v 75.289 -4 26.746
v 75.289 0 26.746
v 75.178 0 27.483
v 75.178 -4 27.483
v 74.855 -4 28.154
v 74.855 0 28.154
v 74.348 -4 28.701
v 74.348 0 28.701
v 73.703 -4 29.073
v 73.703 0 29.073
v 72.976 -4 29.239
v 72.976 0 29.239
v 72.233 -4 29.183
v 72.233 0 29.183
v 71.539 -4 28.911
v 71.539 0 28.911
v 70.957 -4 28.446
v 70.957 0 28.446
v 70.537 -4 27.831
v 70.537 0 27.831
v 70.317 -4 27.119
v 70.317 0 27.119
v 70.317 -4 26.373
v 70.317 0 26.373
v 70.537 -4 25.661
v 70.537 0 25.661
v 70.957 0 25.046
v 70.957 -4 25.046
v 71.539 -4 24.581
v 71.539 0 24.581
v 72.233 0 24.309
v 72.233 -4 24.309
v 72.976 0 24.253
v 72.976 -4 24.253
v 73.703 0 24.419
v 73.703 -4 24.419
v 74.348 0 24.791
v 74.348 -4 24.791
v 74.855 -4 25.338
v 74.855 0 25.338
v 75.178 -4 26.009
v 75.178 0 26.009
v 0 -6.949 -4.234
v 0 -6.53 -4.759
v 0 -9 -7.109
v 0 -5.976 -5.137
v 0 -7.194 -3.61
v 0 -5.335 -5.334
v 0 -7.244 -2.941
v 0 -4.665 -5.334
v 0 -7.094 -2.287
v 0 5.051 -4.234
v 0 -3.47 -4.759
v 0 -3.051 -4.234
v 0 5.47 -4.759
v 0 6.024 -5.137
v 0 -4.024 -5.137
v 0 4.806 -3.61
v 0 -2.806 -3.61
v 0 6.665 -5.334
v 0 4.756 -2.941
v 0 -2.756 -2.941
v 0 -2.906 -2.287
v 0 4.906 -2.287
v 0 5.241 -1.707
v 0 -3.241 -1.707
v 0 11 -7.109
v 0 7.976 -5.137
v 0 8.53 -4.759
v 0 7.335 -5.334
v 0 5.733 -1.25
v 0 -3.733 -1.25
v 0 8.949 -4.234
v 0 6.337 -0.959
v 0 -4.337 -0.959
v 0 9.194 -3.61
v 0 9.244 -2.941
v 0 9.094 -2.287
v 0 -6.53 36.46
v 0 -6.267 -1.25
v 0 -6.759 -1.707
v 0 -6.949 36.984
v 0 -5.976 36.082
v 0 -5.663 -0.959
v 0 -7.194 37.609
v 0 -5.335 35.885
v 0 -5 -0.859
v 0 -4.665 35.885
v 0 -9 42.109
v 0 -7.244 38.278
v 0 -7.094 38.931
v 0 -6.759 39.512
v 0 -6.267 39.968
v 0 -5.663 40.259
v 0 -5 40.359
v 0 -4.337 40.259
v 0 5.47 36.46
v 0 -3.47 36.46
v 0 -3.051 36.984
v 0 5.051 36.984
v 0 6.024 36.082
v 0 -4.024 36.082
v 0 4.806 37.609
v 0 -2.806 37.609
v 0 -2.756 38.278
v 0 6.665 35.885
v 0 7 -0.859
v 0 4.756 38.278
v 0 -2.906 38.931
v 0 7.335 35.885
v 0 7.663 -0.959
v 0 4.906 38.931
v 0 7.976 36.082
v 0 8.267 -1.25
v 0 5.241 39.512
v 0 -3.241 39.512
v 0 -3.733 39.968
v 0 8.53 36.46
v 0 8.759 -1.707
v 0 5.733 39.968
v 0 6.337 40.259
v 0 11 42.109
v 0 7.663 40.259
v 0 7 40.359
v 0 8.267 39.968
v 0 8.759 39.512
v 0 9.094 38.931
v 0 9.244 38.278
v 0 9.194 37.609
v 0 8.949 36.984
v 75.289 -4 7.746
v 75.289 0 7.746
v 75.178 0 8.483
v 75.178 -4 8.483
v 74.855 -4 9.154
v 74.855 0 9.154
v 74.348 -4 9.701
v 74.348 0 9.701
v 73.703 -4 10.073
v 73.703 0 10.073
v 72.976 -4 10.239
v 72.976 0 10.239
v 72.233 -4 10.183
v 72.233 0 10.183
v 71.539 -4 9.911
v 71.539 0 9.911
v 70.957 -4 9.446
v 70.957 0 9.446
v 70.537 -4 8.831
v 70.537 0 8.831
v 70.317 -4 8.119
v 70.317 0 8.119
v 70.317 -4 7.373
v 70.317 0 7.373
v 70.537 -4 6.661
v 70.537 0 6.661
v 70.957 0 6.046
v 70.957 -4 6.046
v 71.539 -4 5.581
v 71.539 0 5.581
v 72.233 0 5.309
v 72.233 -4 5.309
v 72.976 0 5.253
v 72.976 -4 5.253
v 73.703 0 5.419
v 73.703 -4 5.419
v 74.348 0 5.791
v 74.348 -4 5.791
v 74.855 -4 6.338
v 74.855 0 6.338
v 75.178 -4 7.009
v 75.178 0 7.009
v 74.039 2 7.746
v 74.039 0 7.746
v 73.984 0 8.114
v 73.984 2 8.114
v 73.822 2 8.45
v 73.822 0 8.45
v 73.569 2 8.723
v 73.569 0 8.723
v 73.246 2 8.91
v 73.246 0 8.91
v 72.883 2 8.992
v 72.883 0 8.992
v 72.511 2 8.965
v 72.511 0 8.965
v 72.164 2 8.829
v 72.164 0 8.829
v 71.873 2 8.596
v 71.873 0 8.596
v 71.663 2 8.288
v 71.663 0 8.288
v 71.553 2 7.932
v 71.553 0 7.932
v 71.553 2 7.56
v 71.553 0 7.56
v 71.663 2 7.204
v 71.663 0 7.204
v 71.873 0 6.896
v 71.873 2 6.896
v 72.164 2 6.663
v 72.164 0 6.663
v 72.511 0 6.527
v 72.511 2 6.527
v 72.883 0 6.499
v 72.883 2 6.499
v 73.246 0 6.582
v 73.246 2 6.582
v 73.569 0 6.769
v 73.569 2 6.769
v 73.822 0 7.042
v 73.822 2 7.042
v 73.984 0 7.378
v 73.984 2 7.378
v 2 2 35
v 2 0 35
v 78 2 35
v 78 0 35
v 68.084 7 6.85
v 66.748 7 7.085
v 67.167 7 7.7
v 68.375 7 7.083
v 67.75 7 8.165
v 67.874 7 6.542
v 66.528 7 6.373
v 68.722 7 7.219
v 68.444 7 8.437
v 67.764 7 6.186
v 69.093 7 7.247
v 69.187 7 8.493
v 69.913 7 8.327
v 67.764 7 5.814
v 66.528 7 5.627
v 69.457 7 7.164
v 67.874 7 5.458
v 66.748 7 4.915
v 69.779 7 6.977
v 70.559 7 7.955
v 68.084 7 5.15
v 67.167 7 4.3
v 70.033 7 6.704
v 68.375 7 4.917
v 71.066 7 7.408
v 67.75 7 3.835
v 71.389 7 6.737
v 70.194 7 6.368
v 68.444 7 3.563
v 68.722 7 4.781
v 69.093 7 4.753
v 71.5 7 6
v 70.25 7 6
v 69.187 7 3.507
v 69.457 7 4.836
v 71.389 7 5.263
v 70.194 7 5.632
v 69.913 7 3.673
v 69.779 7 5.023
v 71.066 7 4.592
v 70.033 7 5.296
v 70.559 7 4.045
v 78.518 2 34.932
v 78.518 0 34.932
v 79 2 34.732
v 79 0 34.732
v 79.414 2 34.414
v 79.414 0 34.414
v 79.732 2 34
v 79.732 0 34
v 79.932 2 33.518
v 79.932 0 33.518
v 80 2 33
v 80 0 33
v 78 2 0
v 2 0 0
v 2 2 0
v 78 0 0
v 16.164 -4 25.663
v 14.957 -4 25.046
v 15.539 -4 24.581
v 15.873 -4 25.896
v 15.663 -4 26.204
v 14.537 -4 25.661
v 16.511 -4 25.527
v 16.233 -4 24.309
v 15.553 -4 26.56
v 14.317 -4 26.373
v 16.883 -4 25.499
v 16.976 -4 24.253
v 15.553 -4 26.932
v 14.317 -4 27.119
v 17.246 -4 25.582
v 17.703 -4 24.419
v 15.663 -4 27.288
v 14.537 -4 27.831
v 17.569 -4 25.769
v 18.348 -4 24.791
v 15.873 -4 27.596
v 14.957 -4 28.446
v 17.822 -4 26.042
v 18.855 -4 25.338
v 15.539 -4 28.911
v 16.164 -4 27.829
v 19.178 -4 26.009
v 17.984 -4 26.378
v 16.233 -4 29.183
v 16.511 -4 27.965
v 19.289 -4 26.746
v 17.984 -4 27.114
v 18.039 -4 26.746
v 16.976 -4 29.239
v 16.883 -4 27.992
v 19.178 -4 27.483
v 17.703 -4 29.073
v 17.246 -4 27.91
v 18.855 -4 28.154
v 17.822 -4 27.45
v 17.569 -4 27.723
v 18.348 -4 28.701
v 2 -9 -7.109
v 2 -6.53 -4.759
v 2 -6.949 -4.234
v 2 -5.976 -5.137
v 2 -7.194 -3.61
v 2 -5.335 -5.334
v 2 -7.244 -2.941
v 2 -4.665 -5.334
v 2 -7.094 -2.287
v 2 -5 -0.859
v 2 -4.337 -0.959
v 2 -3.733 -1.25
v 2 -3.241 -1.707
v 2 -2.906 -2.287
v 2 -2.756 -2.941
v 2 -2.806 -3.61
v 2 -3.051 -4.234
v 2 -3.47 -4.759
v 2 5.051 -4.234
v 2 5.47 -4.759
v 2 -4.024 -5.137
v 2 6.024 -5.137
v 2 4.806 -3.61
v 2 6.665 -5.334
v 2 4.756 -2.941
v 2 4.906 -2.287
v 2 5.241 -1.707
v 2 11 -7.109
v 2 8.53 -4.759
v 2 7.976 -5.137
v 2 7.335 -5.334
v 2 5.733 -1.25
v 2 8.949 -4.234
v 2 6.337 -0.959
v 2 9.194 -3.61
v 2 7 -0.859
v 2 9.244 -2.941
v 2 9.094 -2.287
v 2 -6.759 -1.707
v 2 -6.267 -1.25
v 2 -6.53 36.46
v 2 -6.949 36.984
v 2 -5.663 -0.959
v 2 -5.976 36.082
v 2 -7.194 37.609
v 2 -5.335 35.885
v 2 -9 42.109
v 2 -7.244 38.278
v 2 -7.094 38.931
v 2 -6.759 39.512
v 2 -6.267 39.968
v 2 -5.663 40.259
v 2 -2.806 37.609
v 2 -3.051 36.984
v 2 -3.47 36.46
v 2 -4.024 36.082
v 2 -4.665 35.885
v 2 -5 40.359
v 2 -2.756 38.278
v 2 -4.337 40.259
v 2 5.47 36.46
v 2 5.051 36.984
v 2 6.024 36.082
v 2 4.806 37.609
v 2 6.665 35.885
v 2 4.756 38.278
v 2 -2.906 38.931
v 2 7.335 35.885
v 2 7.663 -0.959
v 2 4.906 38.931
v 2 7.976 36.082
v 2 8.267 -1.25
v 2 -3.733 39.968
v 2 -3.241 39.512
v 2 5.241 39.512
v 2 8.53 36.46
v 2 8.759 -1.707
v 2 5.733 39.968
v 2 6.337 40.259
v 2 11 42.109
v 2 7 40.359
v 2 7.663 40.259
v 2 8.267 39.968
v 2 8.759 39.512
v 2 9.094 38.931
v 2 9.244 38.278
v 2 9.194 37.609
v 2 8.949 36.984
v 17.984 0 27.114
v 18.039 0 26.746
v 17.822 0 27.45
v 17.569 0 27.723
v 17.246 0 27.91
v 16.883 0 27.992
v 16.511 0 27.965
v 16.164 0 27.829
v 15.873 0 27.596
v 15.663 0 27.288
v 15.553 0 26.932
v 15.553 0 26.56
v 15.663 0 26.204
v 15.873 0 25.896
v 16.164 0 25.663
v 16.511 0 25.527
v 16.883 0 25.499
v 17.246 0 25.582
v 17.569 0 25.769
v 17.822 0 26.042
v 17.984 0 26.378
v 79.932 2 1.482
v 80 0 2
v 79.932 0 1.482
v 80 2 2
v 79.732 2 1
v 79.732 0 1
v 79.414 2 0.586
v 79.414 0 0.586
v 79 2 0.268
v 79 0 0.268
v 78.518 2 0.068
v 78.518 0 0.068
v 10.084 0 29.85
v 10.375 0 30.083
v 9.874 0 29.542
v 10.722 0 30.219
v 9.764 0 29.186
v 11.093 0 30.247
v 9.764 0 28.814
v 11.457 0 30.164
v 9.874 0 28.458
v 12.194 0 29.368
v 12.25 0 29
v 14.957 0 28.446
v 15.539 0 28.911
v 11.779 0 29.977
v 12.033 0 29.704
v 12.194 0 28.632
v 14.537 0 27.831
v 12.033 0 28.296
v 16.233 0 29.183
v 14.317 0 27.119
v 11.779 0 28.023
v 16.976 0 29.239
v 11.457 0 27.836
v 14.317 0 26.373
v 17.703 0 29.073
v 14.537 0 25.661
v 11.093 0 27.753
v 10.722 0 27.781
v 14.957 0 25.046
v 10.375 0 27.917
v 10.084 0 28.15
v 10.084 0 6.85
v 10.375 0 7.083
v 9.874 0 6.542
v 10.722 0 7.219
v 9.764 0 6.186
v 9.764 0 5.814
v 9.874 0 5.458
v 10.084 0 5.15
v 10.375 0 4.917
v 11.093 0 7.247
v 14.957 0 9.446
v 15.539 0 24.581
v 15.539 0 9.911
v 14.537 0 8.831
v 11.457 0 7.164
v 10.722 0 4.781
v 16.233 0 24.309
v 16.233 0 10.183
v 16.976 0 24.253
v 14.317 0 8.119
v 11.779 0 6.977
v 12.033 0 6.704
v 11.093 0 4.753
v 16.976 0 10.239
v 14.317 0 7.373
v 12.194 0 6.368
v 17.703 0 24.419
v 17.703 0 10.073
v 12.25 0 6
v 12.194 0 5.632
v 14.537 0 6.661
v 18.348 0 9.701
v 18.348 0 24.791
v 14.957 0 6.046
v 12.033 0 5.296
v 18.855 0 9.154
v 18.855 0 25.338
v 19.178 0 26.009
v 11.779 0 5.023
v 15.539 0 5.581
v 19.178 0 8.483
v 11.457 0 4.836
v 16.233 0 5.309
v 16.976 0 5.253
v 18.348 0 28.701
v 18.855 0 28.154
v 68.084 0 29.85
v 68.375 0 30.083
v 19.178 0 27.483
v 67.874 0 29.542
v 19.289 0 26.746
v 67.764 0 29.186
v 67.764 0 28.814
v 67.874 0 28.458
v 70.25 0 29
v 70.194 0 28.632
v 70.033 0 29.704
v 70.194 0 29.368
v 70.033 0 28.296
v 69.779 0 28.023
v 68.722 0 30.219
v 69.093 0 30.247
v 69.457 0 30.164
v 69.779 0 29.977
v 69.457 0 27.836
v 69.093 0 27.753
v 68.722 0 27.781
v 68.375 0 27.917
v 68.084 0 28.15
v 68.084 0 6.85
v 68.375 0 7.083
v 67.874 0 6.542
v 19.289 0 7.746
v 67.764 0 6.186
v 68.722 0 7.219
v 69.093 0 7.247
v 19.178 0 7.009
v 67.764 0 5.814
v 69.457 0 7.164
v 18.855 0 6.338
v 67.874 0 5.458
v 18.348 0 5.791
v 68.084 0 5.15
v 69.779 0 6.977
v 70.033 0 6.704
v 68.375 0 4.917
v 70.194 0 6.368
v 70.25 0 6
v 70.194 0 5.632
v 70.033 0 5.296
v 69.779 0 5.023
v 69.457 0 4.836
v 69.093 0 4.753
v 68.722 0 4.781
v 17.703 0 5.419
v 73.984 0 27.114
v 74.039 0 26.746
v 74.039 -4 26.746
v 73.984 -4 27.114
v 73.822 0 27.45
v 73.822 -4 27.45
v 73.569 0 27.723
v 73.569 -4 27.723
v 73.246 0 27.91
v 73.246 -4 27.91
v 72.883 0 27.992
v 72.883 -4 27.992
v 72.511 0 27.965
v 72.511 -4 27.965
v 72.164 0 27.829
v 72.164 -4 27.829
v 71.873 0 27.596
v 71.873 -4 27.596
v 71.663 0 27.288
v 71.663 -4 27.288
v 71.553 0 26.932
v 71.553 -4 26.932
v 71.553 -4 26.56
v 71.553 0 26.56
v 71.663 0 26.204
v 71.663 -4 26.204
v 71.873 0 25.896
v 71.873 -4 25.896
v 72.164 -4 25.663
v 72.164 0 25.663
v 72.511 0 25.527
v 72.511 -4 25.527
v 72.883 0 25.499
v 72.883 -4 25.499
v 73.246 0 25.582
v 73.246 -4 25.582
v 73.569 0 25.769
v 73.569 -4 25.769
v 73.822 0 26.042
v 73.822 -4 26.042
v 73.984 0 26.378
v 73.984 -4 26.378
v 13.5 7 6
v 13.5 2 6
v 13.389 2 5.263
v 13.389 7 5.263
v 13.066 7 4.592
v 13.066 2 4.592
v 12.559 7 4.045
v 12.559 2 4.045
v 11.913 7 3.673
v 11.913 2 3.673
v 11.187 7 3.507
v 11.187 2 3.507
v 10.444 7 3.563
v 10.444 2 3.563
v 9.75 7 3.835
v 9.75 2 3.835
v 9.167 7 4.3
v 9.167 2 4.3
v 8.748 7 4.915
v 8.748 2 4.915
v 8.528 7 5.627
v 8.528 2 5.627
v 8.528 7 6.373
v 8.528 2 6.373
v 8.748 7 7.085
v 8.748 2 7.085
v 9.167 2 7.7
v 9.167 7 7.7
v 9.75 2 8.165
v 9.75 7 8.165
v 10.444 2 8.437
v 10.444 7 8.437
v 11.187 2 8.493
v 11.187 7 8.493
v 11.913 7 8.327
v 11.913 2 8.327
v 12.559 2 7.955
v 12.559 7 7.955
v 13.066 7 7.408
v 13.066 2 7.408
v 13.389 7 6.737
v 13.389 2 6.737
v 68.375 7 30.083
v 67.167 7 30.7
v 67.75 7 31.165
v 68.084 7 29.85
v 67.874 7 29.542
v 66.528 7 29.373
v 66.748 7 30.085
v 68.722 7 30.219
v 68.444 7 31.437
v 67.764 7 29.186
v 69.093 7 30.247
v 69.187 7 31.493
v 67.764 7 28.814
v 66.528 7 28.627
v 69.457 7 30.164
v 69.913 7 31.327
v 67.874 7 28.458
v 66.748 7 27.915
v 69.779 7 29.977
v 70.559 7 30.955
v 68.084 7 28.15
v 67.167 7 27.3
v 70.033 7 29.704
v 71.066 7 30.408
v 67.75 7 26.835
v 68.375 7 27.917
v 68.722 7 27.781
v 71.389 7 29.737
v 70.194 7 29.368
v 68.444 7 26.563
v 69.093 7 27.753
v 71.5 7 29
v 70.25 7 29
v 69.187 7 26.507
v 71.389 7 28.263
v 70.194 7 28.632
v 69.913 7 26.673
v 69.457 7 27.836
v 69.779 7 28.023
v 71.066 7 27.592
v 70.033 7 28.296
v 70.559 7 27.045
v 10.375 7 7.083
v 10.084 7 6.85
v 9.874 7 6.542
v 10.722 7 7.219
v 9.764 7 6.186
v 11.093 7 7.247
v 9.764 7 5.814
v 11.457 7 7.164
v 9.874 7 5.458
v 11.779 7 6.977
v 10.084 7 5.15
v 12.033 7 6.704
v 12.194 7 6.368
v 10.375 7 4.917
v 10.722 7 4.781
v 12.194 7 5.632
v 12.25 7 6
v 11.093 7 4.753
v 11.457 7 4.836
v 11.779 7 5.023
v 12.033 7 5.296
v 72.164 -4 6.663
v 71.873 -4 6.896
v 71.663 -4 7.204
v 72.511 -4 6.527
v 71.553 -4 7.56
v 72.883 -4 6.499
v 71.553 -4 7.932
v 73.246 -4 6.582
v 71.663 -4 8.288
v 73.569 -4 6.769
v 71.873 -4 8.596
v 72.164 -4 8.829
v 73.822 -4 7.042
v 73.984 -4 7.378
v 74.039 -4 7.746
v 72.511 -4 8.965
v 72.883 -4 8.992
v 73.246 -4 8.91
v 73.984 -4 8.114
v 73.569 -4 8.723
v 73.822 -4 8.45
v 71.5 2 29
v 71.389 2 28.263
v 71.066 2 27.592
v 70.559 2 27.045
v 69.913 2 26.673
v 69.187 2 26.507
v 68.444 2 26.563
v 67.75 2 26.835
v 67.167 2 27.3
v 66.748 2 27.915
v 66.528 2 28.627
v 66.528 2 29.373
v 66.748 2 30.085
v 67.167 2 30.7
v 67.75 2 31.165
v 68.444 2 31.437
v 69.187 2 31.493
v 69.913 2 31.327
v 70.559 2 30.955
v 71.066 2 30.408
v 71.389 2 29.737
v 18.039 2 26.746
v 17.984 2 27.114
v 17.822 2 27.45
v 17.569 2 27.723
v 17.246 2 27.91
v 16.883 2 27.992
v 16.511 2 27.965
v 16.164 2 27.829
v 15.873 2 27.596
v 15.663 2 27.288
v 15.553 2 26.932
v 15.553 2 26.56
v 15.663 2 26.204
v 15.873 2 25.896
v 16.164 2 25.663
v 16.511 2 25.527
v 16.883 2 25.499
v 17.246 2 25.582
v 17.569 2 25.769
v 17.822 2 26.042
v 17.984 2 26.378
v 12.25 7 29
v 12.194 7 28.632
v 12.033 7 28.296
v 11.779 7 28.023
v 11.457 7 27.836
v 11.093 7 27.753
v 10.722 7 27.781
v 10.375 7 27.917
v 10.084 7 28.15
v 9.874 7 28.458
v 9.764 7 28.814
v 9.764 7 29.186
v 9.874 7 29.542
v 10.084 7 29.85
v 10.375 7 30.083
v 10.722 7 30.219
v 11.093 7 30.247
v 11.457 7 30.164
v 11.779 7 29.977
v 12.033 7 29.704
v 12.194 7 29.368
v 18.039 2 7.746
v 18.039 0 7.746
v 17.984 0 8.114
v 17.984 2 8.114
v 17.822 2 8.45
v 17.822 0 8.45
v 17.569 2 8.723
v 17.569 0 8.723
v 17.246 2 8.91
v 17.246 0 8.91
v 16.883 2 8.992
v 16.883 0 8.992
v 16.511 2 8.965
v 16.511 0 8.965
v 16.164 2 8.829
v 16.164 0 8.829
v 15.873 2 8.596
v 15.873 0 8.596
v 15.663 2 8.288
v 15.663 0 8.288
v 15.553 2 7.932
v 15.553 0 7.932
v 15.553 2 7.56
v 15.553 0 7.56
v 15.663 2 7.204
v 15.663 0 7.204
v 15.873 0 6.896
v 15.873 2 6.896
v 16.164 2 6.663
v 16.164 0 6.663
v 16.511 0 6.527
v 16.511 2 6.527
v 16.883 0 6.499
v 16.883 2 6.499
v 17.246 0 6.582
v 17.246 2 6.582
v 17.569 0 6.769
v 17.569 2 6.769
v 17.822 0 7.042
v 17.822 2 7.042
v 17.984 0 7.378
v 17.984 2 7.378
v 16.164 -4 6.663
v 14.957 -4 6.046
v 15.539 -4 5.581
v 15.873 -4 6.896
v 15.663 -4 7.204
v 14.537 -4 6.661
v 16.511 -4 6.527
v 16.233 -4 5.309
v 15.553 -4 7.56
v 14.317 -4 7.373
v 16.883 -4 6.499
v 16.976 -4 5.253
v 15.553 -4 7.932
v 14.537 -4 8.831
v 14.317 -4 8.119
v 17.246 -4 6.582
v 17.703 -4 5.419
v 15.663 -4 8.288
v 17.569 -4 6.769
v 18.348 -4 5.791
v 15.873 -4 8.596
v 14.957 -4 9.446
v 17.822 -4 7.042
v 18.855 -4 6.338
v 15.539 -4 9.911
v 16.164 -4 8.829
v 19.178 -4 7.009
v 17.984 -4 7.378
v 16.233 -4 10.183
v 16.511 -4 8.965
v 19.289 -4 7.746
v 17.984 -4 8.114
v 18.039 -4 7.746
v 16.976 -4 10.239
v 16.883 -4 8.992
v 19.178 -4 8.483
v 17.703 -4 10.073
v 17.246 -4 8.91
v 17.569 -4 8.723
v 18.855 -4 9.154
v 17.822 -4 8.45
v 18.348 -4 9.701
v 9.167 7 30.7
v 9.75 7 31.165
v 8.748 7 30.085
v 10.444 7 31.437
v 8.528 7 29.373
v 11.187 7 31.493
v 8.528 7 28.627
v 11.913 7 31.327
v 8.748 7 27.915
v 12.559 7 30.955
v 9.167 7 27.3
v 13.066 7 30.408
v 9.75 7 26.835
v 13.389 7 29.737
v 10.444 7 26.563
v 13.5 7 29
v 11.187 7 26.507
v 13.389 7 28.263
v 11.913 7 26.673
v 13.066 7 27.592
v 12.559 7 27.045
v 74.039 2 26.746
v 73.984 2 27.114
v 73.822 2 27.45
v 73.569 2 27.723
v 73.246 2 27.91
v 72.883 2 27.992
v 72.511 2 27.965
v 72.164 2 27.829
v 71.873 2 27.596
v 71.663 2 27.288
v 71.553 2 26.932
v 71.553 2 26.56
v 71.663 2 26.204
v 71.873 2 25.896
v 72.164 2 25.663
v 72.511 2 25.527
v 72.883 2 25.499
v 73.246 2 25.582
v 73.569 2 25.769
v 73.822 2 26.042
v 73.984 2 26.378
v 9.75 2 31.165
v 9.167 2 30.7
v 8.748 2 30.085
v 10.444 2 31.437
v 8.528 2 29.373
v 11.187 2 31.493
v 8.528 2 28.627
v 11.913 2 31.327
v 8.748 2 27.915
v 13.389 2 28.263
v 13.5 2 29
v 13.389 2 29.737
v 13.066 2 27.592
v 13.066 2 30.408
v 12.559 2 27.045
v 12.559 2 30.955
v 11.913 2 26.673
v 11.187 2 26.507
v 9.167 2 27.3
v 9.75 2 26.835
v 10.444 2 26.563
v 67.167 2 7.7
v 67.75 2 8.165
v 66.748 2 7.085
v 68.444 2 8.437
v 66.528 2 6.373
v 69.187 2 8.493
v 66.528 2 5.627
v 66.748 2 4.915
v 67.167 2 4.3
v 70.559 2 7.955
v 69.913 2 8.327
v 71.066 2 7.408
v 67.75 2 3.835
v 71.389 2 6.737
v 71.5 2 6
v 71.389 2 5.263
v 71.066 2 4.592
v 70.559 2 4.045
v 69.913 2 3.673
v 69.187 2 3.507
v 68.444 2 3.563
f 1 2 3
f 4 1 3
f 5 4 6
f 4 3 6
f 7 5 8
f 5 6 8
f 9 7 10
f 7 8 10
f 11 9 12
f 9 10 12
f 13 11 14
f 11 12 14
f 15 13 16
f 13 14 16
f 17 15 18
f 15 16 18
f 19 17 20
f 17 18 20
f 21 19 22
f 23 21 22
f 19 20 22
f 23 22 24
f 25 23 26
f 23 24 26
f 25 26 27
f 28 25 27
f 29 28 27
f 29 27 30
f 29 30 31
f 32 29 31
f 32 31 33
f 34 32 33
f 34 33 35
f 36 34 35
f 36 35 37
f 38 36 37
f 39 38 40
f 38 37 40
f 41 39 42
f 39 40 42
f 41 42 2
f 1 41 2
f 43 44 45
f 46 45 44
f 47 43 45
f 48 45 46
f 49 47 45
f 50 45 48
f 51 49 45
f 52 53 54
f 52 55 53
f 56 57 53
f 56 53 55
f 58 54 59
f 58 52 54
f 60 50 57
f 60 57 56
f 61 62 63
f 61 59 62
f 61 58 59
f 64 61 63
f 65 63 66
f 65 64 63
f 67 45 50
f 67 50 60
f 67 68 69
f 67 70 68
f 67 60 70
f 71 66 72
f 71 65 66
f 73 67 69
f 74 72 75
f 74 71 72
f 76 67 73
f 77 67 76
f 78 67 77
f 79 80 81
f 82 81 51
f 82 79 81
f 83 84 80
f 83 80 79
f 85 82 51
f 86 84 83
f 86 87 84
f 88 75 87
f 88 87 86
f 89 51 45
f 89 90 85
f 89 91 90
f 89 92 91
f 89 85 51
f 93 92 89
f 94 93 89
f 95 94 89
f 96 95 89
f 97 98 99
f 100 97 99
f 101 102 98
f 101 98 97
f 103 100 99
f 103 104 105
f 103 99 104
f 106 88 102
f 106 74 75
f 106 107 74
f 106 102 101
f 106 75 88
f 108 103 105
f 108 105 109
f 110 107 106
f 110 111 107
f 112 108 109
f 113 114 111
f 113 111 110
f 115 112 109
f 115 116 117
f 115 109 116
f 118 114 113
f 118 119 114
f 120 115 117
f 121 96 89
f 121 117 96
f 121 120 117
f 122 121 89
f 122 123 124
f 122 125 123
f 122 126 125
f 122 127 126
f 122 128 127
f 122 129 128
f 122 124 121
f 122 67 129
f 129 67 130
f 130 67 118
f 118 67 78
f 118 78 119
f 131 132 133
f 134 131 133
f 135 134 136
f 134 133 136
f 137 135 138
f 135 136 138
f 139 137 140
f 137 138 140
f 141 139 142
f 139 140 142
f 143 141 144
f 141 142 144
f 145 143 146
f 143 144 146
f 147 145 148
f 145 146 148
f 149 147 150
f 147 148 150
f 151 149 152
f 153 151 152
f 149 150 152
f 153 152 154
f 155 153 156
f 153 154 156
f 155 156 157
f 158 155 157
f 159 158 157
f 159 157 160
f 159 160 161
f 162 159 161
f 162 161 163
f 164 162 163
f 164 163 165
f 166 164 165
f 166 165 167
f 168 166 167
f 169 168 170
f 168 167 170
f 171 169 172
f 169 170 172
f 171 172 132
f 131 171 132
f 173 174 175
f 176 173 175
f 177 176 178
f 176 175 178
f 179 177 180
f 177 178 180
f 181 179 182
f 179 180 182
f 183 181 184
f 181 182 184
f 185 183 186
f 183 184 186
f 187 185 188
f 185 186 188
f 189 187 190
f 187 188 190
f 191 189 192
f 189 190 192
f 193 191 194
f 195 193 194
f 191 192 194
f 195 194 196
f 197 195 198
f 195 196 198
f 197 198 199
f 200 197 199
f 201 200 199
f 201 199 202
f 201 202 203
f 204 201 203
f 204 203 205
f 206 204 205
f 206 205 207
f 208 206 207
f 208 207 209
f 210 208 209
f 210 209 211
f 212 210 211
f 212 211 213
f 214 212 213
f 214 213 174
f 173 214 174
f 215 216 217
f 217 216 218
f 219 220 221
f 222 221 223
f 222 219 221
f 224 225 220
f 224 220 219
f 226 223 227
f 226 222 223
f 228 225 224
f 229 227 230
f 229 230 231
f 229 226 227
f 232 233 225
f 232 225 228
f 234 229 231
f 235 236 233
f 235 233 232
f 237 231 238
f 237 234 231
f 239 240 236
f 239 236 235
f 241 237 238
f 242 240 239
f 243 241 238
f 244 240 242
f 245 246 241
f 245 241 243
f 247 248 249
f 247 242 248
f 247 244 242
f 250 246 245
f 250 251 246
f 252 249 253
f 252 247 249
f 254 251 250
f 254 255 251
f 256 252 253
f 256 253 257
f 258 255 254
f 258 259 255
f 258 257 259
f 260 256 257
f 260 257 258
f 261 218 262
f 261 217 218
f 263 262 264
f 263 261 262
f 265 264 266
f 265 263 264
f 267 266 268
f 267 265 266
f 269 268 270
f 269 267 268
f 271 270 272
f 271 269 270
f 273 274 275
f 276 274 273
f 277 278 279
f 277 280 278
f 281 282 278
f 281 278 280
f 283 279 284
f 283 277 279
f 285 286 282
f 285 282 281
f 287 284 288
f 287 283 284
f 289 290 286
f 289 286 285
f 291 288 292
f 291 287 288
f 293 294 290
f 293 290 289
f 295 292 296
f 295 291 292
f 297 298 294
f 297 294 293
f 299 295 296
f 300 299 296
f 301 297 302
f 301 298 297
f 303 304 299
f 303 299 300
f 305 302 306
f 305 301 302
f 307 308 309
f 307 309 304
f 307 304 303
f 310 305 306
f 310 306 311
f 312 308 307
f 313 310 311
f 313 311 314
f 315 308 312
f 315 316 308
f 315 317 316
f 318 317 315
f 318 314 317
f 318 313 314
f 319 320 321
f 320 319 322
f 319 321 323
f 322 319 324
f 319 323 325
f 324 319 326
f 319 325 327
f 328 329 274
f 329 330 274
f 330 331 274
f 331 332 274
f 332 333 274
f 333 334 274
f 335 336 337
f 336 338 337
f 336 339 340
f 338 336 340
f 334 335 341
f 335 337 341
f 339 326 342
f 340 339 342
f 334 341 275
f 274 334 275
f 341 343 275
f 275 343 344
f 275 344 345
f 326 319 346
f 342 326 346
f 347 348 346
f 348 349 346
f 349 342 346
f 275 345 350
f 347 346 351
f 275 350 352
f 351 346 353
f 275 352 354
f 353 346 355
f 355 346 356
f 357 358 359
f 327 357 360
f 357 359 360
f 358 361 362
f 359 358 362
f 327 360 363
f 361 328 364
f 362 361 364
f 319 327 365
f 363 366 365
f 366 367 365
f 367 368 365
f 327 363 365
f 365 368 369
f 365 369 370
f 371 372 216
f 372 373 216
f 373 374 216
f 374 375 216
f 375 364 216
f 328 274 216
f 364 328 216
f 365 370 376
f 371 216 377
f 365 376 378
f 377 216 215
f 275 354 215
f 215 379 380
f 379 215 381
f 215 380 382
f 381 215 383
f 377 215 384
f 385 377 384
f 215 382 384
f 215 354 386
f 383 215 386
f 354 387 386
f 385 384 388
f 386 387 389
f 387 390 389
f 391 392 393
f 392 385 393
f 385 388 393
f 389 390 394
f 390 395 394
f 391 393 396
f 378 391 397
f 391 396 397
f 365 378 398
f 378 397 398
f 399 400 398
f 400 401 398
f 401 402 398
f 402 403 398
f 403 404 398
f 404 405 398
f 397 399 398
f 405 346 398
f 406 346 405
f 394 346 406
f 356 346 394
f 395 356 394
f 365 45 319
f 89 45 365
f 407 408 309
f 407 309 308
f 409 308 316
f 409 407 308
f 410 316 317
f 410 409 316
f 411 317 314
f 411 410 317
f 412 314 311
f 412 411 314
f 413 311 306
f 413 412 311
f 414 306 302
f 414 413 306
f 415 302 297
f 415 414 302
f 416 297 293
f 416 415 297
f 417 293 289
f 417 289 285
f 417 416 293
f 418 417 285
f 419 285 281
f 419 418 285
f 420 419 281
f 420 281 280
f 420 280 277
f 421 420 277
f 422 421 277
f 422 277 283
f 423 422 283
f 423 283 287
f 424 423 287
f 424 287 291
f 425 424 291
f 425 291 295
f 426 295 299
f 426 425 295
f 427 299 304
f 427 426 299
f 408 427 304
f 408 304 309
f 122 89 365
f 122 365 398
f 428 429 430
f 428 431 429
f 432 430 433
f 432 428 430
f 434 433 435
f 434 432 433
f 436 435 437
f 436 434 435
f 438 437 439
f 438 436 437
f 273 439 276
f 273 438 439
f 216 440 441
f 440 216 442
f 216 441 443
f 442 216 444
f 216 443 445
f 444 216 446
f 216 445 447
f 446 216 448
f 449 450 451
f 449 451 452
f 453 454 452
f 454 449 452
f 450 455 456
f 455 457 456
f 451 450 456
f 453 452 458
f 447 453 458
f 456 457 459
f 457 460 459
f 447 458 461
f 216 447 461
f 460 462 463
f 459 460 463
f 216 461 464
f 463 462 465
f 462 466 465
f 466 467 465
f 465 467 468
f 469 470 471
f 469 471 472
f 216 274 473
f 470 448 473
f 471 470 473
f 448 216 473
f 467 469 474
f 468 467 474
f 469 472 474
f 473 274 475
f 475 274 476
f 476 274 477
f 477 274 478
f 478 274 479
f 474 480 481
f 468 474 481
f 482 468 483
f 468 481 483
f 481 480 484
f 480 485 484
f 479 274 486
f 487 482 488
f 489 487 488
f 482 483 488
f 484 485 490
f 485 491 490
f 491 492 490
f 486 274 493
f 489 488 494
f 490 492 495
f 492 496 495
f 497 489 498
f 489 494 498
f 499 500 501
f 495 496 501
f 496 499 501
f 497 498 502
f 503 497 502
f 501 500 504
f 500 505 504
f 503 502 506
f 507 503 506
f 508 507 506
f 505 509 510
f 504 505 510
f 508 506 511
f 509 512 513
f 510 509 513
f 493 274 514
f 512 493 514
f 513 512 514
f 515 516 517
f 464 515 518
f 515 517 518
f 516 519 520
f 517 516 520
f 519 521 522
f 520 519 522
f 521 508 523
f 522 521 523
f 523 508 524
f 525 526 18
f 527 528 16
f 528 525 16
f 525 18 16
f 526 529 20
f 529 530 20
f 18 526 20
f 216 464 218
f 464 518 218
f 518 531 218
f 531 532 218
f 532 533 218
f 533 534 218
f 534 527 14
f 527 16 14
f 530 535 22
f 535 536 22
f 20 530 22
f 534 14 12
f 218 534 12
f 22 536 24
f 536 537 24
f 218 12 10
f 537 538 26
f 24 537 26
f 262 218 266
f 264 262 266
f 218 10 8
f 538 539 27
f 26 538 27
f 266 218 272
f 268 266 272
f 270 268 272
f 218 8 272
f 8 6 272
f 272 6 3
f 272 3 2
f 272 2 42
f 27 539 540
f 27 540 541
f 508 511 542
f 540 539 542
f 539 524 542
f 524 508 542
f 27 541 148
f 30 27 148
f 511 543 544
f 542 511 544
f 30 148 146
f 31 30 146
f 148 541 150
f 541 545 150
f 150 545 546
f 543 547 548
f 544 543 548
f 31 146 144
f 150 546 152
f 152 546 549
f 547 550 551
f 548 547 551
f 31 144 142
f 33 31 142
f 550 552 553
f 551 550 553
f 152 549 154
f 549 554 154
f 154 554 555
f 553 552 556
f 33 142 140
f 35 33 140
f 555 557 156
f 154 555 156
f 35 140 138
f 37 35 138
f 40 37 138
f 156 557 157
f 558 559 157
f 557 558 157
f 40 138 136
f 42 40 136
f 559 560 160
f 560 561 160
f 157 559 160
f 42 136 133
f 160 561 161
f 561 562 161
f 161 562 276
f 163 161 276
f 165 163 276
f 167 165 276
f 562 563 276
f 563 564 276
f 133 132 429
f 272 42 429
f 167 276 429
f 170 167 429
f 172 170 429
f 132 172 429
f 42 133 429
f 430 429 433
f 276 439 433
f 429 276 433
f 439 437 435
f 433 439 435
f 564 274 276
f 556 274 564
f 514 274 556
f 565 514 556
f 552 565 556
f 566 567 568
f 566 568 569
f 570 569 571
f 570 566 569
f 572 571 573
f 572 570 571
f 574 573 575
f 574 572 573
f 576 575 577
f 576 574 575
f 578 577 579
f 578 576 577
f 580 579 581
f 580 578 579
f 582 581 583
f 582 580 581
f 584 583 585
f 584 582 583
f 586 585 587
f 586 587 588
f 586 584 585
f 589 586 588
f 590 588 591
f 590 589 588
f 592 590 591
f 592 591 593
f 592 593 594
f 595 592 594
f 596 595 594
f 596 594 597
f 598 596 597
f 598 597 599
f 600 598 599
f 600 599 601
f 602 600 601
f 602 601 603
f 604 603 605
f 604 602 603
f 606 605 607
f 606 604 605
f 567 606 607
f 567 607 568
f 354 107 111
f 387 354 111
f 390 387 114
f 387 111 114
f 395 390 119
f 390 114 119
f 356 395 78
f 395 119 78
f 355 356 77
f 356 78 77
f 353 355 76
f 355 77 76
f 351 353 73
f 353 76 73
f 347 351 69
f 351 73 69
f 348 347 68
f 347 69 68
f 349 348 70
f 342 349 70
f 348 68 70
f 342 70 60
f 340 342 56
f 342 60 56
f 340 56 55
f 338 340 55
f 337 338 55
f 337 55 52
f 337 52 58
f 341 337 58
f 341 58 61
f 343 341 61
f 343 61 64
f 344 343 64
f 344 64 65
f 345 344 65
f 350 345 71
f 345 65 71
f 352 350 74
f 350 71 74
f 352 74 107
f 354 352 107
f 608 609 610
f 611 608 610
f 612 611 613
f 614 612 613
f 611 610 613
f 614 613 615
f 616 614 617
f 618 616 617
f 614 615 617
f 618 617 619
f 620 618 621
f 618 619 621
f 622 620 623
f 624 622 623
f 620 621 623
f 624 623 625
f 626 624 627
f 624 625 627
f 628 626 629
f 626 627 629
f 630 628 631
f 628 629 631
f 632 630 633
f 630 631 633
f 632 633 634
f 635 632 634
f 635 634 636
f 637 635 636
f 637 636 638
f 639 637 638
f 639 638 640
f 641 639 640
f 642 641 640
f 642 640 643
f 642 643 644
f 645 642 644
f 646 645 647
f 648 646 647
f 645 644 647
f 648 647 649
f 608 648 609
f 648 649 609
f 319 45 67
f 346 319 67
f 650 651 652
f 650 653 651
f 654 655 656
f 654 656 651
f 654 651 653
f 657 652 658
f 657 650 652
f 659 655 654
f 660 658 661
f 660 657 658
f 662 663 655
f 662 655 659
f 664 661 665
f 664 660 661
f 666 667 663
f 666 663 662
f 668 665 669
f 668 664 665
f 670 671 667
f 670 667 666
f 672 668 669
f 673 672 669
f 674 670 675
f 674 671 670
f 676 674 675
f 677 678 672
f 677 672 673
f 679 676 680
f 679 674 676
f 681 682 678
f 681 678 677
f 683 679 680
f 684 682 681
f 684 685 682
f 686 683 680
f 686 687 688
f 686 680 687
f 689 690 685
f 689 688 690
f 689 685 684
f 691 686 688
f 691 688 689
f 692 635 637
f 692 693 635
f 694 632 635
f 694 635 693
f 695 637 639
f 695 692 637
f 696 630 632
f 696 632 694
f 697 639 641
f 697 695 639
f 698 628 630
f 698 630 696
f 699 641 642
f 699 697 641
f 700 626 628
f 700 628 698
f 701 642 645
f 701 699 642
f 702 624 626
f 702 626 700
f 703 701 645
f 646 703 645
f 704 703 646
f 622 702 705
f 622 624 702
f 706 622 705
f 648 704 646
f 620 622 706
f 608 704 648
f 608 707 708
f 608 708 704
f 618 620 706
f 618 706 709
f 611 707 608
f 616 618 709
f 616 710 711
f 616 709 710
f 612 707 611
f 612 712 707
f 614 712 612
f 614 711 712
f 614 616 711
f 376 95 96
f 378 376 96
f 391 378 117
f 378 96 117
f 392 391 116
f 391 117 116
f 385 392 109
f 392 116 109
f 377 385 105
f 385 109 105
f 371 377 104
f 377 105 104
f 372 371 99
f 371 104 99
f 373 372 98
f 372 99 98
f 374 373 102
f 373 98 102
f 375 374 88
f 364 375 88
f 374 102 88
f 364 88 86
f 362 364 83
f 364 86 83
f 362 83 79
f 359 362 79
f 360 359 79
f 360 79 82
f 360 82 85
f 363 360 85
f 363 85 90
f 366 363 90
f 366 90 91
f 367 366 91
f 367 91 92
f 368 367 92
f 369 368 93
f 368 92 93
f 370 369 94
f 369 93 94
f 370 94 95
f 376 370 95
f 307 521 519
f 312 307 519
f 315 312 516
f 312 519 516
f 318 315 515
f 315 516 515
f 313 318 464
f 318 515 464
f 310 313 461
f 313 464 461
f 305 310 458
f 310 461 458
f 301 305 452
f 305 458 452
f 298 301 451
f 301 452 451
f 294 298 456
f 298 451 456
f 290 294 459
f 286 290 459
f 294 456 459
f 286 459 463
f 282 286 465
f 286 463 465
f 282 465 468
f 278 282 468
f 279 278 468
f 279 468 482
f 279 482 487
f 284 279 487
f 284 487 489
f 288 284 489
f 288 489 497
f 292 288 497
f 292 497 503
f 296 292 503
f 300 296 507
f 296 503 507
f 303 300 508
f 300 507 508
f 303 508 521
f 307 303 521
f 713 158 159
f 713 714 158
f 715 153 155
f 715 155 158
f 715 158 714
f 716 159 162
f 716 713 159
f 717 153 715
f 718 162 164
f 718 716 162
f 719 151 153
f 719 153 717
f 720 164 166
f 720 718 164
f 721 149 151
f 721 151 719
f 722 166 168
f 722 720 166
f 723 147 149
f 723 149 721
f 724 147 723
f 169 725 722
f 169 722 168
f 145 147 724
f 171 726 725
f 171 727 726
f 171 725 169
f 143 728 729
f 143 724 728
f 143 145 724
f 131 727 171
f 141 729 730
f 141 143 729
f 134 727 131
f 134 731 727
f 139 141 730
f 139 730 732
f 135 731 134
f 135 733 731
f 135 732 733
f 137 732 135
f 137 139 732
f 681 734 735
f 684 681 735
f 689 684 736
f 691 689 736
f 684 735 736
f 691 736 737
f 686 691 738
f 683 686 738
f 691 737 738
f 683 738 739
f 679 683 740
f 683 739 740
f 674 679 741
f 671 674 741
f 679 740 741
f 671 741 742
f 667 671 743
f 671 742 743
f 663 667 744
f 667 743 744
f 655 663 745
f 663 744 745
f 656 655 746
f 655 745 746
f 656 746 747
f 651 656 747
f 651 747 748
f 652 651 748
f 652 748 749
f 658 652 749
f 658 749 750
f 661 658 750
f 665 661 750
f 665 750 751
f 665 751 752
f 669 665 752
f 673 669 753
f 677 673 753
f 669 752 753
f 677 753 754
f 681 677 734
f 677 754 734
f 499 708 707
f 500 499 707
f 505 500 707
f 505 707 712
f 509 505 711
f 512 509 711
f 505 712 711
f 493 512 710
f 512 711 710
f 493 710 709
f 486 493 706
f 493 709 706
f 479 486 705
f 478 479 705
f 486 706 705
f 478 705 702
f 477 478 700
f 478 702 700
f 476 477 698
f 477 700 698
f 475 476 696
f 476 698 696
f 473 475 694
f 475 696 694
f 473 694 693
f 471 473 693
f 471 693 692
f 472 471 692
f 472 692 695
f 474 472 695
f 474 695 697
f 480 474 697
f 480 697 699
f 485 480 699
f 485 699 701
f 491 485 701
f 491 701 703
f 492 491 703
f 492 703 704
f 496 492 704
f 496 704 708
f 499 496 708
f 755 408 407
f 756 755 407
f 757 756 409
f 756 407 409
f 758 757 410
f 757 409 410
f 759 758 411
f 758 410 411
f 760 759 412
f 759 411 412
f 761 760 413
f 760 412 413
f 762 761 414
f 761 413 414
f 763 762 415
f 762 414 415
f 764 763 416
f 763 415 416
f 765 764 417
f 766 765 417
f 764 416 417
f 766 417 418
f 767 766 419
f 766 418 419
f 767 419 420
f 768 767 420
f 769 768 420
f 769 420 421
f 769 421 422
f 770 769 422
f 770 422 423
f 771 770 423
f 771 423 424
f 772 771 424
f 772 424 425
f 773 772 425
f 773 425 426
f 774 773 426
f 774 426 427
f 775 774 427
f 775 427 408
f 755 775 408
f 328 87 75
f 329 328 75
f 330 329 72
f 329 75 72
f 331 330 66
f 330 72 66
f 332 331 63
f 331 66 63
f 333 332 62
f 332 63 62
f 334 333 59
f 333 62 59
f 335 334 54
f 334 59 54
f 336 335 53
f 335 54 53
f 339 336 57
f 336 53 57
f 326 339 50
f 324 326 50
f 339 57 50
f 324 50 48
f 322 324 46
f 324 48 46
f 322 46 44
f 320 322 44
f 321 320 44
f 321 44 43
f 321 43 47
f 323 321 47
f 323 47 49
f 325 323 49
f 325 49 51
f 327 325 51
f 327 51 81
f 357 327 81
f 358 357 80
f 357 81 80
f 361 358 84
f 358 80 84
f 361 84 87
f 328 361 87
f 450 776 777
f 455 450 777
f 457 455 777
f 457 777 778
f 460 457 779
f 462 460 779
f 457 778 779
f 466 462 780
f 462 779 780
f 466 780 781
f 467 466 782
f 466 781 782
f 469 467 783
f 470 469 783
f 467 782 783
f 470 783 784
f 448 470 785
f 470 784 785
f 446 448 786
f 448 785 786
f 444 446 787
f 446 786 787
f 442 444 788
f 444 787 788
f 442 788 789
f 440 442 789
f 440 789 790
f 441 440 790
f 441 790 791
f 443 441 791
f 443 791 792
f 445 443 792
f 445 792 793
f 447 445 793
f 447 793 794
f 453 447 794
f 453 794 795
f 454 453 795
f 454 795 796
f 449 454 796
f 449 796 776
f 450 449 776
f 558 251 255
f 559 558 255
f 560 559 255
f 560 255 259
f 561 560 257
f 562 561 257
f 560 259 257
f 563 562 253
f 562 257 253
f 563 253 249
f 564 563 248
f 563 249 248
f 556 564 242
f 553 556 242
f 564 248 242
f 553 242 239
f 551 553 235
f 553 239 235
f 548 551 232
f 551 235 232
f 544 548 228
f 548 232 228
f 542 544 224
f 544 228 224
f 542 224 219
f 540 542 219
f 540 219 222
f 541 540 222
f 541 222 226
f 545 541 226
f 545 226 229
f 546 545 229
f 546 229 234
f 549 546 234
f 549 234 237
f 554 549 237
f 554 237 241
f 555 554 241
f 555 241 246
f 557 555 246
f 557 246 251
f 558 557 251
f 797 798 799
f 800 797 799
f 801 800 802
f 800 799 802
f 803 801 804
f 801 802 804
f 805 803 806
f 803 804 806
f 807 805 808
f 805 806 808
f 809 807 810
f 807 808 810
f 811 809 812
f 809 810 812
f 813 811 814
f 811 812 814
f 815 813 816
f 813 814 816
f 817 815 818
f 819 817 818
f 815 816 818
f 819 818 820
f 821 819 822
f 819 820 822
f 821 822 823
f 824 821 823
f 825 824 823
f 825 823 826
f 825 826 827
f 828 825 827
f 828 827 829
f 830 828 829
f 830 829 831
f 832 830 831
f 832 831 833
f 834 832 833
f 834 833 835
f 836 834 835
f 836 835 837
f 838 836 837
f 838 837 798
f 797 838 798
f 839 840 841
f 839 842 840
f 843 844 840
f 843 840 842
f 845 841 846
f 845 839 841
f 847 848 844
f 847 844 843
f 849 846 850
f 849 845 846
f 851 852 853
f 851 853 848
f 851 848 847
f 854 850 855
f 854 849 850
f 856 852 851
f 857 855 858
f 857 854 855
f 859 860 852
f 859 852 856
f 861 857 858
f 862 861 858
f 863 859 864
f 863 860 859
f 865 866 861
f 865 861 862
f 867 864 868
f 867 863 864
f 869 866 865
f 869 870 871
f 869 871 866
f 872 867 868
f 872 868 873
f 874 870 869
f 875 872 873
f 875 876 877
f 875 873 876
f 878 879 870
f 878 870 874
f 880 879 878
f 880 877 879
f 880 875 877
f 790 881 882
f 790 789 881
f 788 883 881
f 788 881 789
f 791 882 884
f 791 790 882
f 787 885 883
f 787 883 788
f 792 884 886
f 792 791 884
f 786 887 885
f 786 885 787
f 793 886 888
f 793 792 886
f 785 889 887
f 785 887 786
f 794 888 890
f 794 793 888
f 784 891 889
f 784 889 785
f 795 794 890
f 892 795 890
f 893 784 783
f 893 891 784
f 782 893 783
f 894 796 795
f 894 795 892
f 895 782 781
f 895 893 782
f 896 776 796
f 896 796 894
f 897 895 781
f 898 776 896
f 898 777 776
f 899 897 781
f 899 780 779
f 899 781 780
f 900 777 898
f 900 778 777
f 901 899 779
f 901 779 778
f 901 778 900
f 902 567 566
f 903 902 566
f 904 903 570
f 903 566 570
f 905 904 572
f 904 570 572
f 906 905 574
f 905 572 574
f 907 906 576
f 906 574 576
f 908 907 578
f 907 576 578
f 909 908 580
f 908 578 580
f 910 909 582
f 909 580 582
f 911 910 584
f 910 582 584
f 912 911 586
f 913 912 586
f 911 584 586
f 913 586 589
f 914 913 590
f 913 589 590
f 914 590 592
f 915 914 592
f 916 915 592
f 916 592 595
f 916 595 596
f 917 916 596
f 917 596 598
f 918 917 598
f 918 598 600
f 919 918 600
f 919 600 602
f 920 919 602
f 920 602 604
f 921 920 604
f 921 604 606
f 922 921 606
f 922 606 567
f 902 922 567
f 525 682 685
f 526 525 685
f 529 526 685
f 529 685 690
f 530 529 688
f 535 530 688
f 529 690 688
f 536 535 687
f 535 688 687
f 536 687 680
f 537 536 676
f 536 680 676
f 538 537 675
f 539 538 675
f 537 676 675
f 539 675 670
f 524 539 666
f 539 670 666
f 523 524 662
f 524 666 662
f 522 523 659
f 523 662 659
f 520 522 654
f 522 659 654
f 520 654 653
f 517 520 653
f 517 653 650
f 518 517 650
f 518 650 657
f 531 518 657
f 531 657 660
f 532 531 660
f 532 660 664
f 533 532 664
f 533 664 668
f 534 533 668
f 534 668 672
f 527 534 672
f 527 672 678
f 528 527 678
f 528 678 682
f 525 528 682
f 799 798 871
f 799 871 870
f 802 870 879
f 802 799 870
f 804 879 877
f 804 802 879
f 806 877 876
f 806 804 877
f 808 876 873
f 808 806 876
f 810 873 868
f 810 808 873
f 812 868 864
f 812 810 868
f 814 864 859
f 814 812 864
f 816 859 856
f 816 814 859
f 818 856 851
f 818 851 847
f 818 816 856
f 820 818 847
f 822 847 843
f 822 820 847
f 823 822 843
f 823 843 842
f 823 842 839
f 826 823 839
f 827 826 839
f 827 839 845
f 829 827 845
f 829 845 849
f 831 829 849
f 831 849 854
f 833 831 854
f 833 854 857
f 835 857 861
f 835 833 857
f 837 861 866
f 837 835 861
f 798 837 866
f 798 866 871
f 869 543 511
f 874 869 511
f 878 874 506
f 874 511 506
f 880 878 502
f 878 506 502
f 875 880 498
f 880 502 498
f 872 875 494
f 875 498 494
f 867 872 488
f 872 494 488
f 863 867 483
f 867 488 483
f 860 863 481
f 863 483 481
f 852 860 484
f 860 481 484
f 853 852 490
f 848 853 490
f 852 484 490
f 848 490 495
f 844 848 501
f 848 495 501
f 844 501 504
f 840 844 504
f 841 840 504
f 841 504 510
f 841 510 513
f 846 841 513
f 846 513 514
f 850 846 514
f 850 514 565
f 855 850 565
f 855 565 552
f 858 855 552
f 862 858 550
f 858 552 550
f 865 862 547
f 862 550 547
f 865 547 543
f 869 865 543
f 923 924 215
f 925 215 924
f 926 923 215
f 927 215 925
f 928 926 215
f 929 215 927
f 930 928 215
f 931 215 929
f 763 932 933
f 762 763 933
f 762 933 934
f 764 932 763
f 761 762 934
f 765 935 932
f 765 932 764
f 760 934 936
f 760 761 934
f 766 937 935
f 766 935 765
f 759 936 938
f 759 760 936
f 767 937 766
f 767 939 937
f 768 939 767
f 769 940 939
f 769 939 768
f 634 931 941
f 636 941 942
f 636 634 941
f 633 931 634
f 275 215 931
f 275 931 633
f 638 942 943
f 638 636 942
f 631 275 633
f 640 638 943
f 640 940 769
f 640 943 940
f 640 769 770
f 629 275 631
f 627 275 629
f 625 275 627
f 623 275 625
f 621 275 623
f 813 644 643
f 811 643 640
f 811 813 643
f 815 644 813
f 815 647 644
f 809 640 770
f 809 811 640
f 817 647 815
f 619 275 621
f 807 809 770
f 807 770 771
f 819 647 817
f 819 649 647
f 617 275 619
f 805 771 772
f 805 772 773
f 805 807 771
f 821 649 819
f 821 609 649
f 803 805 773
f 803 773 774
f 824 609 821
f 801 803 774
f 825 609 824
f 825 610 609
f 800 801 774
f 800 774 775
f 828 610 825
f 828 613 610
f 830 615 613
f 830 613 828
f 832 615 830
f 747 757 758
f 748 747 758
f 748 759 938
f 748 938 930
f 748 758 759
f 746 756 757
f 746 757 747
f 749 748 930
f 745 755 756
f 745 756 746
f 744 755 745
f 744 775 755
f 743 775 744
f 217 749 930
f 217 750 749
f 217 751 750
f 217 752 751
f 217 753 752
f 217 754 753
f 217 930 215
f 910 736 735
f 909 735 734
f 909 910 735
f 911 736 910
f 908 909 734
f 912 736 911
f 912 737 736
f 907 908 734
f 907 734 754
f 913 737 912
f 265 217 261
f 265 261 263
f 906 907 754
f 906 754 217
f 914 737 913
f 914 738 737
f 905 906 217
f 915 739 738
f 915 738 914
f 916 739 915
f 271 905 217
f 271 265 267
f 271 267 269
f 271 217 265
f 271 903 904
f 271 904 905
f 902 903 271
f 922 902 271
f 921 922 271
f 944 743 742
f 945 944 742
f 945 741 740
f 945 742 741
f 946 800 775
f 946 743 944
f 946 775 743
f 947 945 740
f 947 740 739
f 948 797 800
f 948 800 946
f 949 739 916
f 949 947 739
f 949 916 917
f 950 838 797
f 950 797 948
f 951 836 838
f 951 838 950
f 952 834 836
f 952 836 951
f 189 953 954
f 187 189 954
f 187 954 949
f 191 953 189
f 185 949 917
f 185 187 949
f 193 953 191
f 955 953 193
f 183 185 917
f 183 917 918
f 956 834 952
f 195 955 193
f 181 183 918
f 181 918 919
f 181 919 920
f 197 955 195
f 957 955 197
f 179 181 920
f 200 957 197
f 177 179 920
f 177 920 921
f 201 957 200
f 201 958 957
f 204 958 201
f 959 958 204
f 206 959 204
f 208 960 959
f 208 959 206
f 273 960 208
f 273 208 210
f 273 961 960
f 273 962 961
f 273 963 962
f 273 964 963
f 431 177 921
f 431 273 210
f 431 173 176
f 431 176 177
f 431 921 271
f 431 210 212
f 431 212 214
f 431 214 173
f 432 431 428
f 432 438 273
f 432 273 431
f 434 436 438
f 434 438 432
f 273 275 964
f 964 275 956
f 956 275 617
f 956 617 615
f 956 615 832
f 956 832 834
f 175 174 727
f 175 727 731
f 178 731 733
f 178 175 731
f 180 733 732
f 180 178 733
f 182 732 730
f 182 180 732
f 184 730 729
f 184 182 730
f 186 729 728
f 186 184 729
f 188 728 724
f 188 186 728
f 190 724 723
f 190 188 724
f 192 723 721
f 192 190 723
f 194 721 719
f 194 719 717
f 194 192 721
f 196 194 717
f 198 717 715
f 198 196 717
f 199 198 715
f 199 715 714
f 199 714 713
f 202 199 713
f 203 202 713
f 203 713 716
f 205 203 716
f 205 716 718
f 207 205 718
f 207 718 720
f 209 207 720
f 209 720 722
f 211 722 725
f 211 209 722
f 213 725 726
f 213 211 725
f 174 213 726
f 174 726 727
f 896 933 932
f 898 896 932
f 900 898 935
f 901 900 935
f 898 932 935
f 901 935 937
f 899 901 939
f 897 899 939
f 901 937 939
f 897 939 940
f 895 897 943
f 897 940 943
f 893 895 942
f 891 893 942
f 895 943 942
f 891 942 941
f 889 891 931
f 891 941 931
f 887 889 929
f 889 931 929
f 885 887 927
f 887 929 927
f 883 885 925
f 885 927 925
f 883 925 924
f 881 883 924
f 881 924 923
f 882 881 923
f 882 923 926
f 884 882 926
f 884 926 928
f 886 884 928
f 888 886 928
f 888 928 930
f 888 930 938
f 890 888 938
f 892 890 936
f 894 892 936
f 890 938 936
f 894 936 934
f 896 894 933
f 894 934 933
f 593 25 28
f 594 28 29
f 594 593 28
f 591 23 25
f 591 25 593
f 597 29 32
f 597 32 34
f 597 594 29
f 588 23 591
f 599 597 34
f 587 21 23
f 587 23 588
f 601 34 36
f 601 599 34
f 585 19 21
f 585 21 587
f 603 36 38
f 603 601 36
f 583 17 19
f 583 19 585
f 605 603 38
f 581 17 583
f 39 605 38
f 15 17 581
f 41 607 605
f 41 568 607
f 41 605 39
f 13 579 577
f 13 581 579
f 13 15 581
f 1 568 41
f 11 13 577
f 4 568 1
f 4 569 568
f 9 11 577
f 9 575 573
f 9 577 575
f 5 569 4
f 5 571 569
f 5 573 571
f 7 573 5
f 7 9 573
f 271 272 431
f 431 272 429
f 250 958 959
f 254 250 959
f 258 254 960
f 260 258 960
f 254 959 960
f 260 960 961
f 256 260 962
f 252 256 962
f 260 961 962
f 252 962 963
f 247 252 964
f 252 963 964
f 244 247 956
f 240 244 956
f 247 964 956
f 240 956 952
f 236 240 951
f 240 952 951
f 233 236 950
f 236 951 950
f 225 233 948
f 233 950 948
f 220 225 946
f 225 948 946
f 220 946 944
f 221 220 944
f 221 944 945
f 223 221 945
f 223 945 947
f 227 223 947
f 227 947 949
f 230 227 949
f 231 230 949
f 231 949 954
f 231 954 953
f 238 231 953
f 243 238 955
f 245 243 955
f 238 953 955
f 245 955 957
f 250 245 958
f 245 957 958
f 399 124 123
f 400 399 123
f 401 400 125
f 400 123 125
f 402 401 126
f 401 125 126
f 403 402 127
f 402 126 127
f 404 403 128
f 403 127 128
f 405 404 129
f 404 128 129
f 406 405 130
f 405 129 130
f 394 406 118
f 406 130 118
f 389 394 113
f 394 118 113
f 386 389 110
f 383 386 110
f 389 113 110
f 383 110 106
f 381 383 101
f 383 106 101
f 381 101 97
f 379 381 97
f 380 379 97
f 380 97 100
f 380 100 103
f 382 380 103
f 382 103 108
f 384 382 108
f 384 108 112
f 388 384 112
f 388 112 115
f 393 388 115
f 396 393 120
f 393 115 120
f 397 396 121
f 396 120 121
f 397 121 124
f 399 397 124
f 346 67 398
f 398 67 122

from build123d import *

# Parameters (mm, degrees)
SKETCH_1_W               = 80
SKETCH_1_H               = 35
EXTRUDE_1_DEPTH          = 2
SKETCH_2_R               = 2.5
EXTRUDE_2_DEPTH          = 5
SKETCH_3_R               = 1.25
CUT_EXTRUDE_1_DEPTH      = 1
CUT_EXTRUDE_1_DEPTH_BACK = 8
FILLET_1_R               = 2
FILLET_2_R               = 2
FILLET_3_R               = 2
FILLET_4_R               = 2
SKETCH_5_R               = 1.25
CUT_EXTRUDE_3_DEPTH      = 10
SKETCH_6_R               = 2.5
SKETCH_6_R_2             = 1.25
EXTRUDE_3_DEPTH          = 4
SKETCH_7_W               = 49.218742156
SKETCH_7_H               = 20
SKETCH_7_R               = 2.25
EXTRUDE_4_DEPTH          = 2


with BuildPart() as part:
    # Эскиз1 → Бобышка-Вытянуть1 (new body)
    with BuildSketch(Plane(origin=(0, 0, 0), x_dir=(1, 0, 0), z_dir=(0, 1, 0))):
        with Locations((40, -17.5)):
            Rectangle(SKETCH_1_W, SKETCH_1_H)
    extrude(amount=EXTRUDE_1_DEPTH)

    # Эскиз2 → Бобышка-Вытянуть2 (add)
    with BuildSketch(Plane(origin=(0, 2, 0), x_dir=(1, 0, 0), z_dir=(0, 1, 0))):
        with Locations((11, -6)):
            Circle(SKETCH_2_R)
        with Locations((11, -29)):
            Circle(SKETCH_2_R)
        with Locations((69, -6)):
            Circle(SKETCH_2_R)
        with Locations((69, -29)):
            Circle(SKETCH_2_R)
    extrude(amount=EXTRUDE_2_DEPTH)

    # Эскиз3 → Вырез-Вытянуть1 (cut, two sides)
    with BuildSketch(Plane(origin=(0, 7, 0), x_dir=(1, 0, 0), z_dir=(0, 1, 0))) as cut_extrude_1_sk:
        with Locations((11, -6)):
            Circle(SKETCH_3_R)
        with Locations((11, -29)):
            Circle(SKETCH_3_R)
        with Locations((69, -6)):
            Circle(SKETCH_3_R)
        with Locations((69, -29)):
            Circle(SKETCH_3_R)
    extrude(amount=CUT_EXTRUDE_1_DEPTH, mode=Mode.SUBTRACT)
    extrude(cut_extrude_1_sk.sketch, amount=-CUT_EXTRUDE_1_DEPTH_BACK, mode=Mode.SUBTRACT)

    # Скругление1
    fillet_1_edges = [part.edges().sort_by_distance(p)[0] for p in [
        (0, 1, 0),
    ]]
    fillet(fillet_1_edges, radius=FILLET_1_R)

    # Скругление2
    fillet_2_edges = [part.edges().sort_by_distance(p)[0] for p in [
        (0, 1, 35),
    ]]
    fillet(fillet_2_edges, radius=FILLET_2_R)

    # Скругление3
    fillet_3_edges = [part.edges().sort_by_distance(p)[0] for p in [
        (80, 1, 35),
    ]]
    fillet(fillet_3_edges, radius=FILLET_3_R)

    # Скругление4
    fillet_4_edges = [part.edges().sort_by_distance(p)[0] for p in [
        (80, 1, 0),
    ]]
    fillet(fillet_4_edges, radius=FILLET_4_R)

    # Эскиз5 → Вырез-Вытянуть3 (cut)
    with BuildSketch(Plane.XZ):
        with Locations((16.789329721, 26.745983075)):
            Circle(SKETCH_5_R)
        with Locations((72.789329721, 26.745983075)):
            Circle(SKETCH_5_R)
        with Locations((72.789329721, 7.745983075)):
            Circle(SKETCH_5_R)
        with Locations((16.789329721, 7.745983075)):
            Circle(SKETCH_5_R)
    extrude(amount=-CUT_EXTRUDE_3_DEPTH, mode=Mode.SUBTRACT)

    # Эскиз6 → Бобышка-Вытянуть3 (add)
    with BuildSketch(Plane.XZ):
        with Locations((16.789329721, 26.745983075)):
            Circle(SKETCH_6_R)
        with Locations((16.789329721, 26.745983075)):
            Circle(SKETCH_6_R_2, mode=Mode.SUBTRACT)
        with Locations((72.789329721, 26.745983075)):
            Circle(SKETCH_6_R)
        with Locations((72.789329721, 26.745983075)):
            Circle(SKETCH_6_R_2, mode=Mode.SUBTRACT)
        with Locations((72.789329721, 7.745983075)):
            Circle(SKETCH_6_R)
        with Locations((72.789329721, 7.745983075)):
            Circle(SKETCH_6_R_2, mode=Mode.SUBTRACT)
        with Locations((16.789329721, 7.745983075)):
            Circle(SKETCH_6_R)
        with Locations((16.789329721, 7.745983075)):
            Circle(SKETCH_6_R_2, mode=Mode.SUBTRACT)
    extrude(amount=EXTRUDE_3_DEPTH)

    # Эскиз7 → Бобышка-Вытянуть4 (add)
    with BuildSketch(Plane.ZY):
        with Locations((17.5, 1)):
            Rectangle(SKETCH_7_W, SKETCH_7_H)
        with Locations((38.109371078, -5)):
            Circle(SKETCH_7_R, mode=Mode.SUBTRACT)
        with Locations((-3.109371078, -5)):
            Circle(SKETCH_7_R, mode=Mode.SUBTRACT)
        with Locations((-3.109371078, 7)):
            Circle(SKETCH_7_R, mode=Mode.SUBTRACT)
        with Locations((38.109371078, 7)):
            Circle(SKETCH_7_R, mode=Mode.SUBTRACT)
    extrude(amount=-EXTRUDE_4_DEPTH)


solid = part.part
